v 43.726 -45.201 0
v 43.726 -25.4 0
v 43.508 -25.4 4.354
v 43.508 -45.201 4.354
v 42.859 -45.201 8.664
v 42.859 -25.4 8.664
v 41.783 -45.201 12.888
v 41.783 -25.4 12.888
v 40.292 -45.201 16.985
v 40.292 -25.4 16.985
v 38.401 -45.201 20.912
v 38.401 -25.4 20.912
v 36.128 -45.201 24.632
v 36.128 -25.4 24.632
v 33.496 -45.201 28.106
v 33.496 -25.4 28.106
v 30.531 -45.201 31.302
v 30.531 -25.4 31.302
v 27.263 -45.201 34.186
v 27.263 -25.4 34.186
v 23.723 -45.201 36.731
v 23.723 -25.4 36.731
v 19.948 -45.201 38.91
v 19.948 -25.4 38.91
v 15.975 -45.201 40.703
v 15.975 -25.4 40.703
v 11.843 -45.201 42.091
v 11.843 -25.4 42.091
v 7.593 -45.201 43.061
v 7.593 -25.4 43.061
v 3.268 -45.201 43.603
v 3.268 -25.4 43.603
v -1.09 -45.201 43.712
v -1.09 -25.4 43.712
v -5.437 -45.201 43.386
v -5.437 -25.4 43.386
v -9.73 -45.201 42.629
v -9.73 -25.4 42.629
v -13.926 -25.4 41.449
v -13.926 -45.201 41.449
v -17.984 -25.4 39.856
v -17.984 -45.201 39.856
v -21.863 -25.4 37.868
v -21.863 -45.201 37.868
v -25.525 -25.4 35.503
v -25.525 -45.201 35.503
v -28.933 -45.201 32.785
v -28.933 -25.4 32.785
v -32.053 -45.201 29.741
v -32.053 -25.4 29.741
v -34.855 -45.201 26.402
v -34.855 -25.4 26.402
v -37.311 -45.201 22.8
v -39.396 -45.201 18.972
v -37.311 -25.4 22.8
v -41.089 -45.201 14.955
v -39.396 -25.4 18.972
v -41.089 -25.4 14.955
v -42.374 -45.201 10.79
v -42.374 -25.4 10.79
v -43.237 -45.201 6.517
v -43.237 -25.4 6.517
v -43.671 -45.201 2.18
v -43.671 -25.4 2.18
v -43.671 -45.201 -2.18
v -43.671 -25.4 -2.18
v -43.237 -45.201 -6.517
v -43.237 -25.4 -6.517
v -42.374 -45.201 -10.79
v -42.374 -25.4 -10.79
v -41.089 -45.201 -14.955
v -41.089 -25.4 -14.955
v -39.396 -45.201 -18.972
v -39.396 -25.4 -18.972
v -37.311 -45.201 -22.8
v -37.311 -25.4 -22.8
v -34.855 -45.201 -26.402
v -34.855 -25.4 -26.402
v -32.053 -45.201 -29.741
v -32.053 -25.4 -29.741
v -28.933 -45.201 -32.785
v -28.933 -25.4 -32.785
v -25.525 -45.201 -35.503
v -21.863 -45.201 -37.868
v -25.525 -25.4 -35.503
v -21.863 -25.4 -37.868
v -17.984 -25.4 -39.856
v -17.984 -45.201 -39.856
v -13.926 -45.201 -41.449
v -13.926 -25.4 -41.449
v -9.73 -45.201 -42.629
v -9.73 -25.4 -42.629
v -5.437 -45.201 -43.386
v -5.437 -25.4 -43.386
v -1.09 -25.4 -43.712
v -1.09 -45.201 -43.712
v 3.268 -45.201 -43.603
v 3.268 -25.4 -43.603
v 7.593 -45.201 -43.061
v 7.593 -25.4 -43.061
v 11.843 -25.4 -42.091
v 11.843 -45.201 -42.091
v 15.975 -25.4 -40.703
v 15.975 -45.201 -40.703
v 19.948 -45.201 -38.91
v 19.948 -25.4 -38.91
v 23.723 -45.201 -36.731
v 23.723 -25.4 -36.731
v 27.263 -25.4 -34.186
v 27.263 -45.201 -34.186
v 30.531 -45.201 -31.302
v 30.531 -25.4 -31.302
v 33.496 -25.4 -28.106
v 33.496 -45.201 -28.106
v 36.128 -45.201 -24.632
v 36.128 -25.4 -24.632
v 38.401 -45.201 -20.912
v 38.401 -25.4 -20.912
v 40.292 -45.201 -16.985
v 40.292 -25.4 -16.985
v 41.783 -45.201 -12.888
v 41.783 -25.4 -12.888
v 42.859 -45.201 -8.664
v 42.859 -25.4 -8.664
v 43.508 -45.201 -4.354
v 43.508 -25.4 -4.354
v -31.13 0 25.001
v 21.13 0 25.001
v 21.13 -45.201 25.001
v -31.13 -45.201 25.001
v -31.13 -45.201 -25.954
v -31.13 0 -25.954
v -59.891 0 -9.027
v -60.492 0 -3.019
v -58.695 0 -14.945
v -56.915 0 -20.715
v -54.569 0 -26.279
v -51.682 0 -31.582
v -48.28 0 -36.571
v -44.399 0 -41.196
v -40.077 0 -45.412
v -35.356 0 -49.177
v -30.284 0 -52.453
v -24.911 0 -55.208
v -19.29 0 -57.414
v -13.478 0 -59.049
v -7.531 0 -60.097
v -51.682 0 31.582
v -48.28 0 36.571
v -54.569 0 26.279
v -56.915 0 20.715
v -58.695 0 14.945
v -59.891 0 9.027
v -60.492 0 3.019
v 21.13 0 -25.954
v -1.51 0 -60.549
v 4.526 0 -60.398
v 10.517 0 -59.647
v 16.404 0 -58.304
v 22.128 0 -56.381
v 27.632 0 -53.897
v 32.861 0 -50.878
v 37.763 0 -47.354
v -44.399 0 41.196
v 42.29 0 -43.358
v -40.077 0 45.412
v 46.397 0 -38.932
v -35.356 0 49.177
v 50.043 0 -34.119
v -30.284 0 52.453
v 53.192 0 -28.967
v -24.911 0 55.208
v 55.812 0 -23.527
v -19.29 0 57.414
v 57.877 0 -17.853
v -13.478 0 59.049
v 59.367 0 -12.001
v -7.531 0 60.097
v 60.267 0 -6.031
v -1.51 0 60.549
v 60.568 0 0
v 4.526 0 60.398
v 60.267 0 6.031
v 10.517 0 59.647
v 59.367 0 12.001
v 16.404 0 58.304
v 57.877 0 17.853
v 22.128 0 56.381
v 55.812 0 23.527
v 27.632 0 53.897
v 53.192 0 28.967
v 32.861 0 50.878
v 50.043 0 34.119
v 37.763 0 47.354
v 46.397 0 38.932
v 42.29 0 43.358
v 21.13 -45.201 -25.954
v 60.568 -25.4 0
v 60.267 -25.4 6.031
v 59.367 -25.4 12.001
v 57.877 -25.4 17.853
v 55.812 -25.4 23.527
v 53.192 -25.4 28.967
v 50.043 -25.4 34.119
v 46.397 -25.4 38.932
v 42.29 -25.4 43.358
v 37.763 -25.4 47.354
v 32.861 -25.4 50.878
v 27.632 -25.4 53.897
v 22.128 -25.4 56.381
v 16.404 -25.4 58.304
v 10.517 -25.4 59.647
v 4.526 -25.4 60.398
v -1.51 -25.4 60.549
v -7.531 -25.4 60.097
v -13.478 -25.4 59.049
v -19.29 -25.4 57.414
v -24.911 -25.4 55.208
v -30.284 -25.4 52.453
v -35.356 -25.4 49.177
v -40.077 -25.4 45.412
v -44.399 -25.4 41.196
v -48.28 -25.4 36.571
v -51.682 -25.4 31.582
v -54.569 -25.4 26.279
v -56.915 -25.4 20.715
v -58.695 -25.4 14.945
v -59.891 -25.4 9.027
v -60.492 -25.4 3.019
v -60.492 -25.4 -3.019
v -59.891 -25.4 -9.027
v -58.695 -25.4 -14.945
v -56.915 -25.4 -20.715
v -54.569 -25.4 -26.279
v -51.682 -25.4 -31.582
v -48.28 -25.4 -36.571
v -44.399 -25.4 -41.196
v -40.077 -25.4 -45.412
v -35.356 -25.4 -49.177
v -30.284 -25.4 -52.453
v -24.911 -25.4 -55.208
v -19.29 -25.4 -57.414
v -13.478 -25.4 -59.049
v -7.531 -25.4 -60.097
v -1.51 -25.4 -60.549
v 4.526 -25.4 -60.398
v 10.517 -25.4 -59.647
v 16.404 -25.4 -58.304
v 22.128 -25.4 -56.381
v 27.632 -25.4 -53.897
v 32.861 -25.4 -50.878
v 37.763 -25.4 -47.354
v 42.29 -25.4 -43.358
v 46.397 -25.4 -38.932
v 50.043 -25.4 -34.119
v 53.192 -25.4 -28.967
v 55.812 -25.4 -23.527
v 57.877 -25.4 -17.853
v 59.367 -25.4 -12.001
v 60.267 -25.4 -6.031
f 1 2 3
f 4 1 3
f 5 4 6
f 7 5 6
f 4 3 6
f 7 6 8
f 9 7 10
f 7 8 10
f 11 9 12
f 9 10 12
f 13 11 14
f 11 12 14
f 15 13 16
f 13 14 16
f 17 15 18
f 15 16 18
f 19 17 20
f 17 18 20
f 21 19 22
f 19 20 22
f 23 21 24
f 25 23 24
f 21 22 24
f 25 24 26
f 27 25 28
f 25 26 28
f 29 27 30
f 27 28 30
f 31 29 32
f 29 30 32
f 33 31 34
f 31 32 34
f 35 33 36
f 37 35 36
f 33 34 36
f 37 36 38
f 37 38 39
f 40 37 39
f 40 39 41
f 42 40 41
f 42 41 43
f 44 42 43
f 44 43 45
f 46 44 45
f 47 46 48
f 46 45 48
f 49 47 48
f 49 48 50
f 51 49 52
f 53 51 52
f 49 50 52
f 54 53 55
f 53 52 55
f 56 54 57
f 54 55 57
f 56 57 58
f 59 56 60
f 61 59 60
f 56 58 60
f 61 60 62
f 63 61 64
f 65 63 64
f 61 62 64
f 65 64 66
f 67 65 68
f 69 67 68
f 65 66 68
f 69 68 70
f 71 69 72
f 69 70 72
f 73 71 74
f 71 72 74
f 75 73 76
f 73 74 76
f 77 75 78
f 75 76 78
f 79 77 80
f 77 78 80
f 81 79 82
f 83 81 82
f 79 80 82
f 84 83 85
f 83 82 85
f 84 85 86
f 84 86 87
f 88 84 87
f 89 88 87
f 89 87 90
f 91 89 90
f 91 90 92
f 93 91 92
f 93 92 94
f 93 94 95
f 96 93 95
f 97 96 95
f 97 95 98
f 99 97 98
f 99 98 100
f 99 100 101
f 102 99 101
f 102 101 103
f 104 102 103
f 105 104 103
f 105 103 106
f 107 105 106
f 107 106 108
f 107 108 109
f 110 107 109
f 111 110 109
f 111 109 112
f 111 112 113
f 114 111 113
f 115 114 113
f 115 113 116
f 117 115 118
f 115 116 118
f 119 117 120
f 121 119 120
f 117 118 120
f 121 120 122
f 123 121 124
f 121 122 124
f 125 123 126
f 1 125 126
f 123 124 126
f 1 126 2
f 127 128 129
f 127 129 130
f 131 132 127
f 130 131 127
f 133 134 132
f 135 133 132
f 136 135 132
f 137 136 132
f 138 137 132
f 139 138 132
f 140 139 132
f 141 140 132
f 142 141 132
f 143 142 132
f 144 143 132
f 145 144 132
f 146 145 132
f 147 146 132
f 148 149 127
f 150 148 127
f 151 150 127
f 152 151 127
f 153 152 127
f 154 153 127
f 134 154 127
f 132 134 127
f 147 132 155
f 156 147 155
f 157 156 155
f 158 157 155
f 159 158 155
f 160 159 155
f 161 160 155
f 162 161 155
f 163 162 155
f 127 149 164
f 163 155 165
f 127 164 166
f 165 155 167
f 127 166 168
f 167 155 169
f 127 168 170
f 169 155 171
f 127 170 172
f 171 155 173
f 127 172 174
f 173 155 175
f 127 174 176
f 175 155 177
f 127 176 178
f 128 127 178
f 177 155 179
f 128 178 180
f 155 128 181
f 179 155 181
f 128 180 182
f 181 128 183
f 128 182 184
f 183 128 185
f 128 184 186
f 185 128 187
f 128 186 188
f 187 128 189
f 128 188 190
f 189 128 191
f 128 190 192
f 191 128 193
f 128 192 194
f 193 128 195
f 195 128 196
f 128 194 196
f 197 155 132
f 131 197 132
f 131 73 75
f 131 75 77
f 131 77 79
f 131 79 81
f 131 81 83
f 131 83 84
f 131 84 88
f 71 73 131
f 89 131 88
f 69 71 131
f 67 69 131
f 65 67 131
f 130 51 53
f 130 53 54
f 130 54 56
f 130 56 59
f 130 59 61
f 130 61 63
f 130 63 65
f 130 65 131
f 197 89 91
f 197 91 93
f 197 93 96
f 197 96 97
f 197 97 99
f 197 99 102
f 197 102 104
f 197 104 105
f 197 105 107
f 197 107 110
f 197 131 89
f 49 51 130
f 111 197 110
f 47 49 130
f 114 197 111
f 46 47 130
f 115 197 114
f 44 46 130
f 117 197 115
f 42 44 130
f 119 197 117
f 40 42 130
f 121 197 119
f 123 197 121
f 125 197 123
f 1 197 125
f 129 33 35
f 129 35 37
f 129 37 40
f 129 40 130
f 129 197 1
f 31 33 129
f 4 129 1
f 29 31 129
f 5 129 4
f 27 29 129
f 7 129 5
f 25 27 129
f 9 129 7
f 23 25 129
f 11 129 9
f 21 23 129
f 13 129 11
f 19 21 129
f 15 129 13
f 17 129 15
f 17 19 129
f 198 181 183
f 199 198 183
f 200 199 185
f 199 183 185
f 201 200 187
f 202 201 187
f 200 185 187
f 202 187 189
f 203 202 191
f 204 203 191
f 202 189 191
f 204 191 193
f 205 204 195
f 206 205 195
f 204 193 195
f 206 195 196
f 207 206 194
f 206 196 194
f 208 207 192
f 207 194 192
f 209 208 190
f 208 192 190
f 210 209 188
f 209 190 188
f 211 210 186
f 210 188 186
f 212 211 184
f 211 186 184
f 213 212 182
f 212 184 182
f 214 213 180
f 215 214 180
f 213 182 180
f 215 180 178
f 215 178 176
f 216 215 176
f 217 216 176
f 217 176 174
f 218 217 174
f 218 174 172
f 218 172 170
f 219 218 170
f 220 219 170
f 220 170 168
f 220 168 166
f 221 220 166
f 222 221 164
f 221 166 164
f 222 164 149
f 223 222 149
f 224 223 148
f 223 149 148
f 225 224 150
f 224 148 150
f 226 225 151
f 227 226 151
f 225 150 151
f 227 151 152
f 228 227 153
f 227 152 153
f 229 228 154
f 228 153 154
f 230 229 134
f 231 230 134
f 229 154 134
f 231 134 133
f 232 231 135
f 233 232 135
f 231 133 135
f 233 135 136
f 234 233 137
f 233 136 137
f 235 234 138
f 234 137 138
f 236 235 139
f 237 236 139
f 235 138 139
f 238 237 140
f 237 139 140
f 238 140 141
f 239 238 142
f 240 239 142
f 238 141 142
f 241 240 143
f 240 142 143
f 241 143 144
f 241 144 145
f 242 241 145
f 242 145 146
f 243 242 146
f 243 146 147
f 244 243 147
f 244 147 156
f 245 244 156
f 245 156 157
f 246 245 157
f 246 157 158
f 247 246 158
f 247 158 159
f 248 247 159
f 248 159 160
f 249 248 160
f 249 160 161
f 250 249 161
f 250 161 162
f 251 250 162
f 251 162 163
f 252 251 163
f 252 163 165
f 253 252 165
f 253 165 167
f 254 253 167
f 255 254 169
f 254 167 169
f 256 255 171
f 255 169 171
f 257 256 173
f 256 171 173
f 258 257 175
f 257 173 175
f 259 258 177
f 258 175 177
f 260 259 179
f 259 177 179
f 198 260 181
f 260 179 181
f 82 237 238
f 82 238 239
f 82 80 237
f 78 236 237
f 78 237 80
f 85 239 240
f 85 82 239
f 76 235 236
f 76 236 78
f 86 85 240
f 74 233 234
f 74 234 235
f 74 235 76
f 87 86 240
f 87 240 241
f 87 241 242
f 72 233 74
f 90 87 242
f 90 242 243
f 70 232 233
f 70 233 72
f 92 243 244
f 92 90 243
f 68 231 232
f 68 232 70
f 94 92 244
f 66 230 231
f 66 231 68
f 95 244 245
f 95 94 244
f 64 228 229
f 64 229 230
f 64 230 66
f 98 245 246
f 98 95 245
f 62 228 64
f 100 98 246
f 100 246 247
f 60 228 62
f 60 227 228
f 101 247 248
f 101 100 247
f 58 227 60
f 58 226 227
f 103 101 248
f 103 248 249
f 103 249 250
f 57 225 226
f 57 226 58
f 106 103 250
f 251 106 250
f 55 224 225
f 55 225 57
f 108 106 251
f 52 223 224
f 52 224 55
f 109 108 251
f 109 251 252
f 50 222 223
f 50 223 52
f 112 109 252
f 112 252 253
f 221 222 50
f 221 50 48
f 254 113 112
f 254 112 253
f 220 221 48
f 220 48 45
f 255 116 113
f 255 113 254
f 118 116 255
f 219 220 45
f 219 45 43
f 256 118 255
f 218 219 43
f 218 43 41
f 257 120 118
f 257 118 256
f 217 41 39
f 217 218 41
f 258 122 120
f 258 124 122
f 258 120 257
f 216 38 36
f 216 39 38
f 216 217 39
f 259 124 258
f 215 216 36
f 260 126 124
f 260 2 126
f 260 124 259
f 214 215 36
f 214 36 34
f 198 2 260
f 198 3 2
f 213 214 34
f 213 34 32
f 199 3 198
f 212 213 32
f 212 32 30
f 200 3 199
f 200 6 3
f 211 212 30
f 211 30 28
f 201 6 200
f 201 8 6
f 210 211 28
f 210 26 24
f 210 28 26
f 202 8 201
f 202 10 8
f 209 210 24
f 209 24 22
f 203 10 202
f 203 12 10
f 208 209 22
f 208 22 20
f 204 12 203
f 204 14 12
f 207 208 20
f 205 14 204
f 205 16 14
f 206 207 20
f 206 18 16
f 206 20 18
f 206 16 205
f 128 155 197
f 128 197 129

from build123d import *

# Parameters (mm, degrees)
F0_R     = 60.567537
F1_DEPTH = 25.4
F2_R     = 43.725742
F3_DEPTH = 19.801166
F4_W     = 52.260071
F4_H     = 50.955355
F5_DEPTH = 118.063478


with BuildPart() as f1:
    # F0 (on Front) → F1 (new body)
    with BuildSketch(Plane.XZ):
        Circle(F0_R)
    extrude(amount=F1_DEPTH)

    # F2 (on face) → F3 (join)
    with BuildSketch(Plane.XZ.offset(25.4)):
        Circle(F2_R)
    extrude(amount=F3_DEPTH)

    # F4 (on face) → F5 (cut)
    with BuildSketch(Plane(origin=(0, 0, 0), x_dir=(-1, 0, 0), z_dir=(0, 1, 0))):
        with Locations((5.000293, -0.476226)):
            Rectangle(F4_W, F4_H)
    extrude(amount=-F5_DEPTH, mode=Mode.SUBTRACT)


solid = f1.part
